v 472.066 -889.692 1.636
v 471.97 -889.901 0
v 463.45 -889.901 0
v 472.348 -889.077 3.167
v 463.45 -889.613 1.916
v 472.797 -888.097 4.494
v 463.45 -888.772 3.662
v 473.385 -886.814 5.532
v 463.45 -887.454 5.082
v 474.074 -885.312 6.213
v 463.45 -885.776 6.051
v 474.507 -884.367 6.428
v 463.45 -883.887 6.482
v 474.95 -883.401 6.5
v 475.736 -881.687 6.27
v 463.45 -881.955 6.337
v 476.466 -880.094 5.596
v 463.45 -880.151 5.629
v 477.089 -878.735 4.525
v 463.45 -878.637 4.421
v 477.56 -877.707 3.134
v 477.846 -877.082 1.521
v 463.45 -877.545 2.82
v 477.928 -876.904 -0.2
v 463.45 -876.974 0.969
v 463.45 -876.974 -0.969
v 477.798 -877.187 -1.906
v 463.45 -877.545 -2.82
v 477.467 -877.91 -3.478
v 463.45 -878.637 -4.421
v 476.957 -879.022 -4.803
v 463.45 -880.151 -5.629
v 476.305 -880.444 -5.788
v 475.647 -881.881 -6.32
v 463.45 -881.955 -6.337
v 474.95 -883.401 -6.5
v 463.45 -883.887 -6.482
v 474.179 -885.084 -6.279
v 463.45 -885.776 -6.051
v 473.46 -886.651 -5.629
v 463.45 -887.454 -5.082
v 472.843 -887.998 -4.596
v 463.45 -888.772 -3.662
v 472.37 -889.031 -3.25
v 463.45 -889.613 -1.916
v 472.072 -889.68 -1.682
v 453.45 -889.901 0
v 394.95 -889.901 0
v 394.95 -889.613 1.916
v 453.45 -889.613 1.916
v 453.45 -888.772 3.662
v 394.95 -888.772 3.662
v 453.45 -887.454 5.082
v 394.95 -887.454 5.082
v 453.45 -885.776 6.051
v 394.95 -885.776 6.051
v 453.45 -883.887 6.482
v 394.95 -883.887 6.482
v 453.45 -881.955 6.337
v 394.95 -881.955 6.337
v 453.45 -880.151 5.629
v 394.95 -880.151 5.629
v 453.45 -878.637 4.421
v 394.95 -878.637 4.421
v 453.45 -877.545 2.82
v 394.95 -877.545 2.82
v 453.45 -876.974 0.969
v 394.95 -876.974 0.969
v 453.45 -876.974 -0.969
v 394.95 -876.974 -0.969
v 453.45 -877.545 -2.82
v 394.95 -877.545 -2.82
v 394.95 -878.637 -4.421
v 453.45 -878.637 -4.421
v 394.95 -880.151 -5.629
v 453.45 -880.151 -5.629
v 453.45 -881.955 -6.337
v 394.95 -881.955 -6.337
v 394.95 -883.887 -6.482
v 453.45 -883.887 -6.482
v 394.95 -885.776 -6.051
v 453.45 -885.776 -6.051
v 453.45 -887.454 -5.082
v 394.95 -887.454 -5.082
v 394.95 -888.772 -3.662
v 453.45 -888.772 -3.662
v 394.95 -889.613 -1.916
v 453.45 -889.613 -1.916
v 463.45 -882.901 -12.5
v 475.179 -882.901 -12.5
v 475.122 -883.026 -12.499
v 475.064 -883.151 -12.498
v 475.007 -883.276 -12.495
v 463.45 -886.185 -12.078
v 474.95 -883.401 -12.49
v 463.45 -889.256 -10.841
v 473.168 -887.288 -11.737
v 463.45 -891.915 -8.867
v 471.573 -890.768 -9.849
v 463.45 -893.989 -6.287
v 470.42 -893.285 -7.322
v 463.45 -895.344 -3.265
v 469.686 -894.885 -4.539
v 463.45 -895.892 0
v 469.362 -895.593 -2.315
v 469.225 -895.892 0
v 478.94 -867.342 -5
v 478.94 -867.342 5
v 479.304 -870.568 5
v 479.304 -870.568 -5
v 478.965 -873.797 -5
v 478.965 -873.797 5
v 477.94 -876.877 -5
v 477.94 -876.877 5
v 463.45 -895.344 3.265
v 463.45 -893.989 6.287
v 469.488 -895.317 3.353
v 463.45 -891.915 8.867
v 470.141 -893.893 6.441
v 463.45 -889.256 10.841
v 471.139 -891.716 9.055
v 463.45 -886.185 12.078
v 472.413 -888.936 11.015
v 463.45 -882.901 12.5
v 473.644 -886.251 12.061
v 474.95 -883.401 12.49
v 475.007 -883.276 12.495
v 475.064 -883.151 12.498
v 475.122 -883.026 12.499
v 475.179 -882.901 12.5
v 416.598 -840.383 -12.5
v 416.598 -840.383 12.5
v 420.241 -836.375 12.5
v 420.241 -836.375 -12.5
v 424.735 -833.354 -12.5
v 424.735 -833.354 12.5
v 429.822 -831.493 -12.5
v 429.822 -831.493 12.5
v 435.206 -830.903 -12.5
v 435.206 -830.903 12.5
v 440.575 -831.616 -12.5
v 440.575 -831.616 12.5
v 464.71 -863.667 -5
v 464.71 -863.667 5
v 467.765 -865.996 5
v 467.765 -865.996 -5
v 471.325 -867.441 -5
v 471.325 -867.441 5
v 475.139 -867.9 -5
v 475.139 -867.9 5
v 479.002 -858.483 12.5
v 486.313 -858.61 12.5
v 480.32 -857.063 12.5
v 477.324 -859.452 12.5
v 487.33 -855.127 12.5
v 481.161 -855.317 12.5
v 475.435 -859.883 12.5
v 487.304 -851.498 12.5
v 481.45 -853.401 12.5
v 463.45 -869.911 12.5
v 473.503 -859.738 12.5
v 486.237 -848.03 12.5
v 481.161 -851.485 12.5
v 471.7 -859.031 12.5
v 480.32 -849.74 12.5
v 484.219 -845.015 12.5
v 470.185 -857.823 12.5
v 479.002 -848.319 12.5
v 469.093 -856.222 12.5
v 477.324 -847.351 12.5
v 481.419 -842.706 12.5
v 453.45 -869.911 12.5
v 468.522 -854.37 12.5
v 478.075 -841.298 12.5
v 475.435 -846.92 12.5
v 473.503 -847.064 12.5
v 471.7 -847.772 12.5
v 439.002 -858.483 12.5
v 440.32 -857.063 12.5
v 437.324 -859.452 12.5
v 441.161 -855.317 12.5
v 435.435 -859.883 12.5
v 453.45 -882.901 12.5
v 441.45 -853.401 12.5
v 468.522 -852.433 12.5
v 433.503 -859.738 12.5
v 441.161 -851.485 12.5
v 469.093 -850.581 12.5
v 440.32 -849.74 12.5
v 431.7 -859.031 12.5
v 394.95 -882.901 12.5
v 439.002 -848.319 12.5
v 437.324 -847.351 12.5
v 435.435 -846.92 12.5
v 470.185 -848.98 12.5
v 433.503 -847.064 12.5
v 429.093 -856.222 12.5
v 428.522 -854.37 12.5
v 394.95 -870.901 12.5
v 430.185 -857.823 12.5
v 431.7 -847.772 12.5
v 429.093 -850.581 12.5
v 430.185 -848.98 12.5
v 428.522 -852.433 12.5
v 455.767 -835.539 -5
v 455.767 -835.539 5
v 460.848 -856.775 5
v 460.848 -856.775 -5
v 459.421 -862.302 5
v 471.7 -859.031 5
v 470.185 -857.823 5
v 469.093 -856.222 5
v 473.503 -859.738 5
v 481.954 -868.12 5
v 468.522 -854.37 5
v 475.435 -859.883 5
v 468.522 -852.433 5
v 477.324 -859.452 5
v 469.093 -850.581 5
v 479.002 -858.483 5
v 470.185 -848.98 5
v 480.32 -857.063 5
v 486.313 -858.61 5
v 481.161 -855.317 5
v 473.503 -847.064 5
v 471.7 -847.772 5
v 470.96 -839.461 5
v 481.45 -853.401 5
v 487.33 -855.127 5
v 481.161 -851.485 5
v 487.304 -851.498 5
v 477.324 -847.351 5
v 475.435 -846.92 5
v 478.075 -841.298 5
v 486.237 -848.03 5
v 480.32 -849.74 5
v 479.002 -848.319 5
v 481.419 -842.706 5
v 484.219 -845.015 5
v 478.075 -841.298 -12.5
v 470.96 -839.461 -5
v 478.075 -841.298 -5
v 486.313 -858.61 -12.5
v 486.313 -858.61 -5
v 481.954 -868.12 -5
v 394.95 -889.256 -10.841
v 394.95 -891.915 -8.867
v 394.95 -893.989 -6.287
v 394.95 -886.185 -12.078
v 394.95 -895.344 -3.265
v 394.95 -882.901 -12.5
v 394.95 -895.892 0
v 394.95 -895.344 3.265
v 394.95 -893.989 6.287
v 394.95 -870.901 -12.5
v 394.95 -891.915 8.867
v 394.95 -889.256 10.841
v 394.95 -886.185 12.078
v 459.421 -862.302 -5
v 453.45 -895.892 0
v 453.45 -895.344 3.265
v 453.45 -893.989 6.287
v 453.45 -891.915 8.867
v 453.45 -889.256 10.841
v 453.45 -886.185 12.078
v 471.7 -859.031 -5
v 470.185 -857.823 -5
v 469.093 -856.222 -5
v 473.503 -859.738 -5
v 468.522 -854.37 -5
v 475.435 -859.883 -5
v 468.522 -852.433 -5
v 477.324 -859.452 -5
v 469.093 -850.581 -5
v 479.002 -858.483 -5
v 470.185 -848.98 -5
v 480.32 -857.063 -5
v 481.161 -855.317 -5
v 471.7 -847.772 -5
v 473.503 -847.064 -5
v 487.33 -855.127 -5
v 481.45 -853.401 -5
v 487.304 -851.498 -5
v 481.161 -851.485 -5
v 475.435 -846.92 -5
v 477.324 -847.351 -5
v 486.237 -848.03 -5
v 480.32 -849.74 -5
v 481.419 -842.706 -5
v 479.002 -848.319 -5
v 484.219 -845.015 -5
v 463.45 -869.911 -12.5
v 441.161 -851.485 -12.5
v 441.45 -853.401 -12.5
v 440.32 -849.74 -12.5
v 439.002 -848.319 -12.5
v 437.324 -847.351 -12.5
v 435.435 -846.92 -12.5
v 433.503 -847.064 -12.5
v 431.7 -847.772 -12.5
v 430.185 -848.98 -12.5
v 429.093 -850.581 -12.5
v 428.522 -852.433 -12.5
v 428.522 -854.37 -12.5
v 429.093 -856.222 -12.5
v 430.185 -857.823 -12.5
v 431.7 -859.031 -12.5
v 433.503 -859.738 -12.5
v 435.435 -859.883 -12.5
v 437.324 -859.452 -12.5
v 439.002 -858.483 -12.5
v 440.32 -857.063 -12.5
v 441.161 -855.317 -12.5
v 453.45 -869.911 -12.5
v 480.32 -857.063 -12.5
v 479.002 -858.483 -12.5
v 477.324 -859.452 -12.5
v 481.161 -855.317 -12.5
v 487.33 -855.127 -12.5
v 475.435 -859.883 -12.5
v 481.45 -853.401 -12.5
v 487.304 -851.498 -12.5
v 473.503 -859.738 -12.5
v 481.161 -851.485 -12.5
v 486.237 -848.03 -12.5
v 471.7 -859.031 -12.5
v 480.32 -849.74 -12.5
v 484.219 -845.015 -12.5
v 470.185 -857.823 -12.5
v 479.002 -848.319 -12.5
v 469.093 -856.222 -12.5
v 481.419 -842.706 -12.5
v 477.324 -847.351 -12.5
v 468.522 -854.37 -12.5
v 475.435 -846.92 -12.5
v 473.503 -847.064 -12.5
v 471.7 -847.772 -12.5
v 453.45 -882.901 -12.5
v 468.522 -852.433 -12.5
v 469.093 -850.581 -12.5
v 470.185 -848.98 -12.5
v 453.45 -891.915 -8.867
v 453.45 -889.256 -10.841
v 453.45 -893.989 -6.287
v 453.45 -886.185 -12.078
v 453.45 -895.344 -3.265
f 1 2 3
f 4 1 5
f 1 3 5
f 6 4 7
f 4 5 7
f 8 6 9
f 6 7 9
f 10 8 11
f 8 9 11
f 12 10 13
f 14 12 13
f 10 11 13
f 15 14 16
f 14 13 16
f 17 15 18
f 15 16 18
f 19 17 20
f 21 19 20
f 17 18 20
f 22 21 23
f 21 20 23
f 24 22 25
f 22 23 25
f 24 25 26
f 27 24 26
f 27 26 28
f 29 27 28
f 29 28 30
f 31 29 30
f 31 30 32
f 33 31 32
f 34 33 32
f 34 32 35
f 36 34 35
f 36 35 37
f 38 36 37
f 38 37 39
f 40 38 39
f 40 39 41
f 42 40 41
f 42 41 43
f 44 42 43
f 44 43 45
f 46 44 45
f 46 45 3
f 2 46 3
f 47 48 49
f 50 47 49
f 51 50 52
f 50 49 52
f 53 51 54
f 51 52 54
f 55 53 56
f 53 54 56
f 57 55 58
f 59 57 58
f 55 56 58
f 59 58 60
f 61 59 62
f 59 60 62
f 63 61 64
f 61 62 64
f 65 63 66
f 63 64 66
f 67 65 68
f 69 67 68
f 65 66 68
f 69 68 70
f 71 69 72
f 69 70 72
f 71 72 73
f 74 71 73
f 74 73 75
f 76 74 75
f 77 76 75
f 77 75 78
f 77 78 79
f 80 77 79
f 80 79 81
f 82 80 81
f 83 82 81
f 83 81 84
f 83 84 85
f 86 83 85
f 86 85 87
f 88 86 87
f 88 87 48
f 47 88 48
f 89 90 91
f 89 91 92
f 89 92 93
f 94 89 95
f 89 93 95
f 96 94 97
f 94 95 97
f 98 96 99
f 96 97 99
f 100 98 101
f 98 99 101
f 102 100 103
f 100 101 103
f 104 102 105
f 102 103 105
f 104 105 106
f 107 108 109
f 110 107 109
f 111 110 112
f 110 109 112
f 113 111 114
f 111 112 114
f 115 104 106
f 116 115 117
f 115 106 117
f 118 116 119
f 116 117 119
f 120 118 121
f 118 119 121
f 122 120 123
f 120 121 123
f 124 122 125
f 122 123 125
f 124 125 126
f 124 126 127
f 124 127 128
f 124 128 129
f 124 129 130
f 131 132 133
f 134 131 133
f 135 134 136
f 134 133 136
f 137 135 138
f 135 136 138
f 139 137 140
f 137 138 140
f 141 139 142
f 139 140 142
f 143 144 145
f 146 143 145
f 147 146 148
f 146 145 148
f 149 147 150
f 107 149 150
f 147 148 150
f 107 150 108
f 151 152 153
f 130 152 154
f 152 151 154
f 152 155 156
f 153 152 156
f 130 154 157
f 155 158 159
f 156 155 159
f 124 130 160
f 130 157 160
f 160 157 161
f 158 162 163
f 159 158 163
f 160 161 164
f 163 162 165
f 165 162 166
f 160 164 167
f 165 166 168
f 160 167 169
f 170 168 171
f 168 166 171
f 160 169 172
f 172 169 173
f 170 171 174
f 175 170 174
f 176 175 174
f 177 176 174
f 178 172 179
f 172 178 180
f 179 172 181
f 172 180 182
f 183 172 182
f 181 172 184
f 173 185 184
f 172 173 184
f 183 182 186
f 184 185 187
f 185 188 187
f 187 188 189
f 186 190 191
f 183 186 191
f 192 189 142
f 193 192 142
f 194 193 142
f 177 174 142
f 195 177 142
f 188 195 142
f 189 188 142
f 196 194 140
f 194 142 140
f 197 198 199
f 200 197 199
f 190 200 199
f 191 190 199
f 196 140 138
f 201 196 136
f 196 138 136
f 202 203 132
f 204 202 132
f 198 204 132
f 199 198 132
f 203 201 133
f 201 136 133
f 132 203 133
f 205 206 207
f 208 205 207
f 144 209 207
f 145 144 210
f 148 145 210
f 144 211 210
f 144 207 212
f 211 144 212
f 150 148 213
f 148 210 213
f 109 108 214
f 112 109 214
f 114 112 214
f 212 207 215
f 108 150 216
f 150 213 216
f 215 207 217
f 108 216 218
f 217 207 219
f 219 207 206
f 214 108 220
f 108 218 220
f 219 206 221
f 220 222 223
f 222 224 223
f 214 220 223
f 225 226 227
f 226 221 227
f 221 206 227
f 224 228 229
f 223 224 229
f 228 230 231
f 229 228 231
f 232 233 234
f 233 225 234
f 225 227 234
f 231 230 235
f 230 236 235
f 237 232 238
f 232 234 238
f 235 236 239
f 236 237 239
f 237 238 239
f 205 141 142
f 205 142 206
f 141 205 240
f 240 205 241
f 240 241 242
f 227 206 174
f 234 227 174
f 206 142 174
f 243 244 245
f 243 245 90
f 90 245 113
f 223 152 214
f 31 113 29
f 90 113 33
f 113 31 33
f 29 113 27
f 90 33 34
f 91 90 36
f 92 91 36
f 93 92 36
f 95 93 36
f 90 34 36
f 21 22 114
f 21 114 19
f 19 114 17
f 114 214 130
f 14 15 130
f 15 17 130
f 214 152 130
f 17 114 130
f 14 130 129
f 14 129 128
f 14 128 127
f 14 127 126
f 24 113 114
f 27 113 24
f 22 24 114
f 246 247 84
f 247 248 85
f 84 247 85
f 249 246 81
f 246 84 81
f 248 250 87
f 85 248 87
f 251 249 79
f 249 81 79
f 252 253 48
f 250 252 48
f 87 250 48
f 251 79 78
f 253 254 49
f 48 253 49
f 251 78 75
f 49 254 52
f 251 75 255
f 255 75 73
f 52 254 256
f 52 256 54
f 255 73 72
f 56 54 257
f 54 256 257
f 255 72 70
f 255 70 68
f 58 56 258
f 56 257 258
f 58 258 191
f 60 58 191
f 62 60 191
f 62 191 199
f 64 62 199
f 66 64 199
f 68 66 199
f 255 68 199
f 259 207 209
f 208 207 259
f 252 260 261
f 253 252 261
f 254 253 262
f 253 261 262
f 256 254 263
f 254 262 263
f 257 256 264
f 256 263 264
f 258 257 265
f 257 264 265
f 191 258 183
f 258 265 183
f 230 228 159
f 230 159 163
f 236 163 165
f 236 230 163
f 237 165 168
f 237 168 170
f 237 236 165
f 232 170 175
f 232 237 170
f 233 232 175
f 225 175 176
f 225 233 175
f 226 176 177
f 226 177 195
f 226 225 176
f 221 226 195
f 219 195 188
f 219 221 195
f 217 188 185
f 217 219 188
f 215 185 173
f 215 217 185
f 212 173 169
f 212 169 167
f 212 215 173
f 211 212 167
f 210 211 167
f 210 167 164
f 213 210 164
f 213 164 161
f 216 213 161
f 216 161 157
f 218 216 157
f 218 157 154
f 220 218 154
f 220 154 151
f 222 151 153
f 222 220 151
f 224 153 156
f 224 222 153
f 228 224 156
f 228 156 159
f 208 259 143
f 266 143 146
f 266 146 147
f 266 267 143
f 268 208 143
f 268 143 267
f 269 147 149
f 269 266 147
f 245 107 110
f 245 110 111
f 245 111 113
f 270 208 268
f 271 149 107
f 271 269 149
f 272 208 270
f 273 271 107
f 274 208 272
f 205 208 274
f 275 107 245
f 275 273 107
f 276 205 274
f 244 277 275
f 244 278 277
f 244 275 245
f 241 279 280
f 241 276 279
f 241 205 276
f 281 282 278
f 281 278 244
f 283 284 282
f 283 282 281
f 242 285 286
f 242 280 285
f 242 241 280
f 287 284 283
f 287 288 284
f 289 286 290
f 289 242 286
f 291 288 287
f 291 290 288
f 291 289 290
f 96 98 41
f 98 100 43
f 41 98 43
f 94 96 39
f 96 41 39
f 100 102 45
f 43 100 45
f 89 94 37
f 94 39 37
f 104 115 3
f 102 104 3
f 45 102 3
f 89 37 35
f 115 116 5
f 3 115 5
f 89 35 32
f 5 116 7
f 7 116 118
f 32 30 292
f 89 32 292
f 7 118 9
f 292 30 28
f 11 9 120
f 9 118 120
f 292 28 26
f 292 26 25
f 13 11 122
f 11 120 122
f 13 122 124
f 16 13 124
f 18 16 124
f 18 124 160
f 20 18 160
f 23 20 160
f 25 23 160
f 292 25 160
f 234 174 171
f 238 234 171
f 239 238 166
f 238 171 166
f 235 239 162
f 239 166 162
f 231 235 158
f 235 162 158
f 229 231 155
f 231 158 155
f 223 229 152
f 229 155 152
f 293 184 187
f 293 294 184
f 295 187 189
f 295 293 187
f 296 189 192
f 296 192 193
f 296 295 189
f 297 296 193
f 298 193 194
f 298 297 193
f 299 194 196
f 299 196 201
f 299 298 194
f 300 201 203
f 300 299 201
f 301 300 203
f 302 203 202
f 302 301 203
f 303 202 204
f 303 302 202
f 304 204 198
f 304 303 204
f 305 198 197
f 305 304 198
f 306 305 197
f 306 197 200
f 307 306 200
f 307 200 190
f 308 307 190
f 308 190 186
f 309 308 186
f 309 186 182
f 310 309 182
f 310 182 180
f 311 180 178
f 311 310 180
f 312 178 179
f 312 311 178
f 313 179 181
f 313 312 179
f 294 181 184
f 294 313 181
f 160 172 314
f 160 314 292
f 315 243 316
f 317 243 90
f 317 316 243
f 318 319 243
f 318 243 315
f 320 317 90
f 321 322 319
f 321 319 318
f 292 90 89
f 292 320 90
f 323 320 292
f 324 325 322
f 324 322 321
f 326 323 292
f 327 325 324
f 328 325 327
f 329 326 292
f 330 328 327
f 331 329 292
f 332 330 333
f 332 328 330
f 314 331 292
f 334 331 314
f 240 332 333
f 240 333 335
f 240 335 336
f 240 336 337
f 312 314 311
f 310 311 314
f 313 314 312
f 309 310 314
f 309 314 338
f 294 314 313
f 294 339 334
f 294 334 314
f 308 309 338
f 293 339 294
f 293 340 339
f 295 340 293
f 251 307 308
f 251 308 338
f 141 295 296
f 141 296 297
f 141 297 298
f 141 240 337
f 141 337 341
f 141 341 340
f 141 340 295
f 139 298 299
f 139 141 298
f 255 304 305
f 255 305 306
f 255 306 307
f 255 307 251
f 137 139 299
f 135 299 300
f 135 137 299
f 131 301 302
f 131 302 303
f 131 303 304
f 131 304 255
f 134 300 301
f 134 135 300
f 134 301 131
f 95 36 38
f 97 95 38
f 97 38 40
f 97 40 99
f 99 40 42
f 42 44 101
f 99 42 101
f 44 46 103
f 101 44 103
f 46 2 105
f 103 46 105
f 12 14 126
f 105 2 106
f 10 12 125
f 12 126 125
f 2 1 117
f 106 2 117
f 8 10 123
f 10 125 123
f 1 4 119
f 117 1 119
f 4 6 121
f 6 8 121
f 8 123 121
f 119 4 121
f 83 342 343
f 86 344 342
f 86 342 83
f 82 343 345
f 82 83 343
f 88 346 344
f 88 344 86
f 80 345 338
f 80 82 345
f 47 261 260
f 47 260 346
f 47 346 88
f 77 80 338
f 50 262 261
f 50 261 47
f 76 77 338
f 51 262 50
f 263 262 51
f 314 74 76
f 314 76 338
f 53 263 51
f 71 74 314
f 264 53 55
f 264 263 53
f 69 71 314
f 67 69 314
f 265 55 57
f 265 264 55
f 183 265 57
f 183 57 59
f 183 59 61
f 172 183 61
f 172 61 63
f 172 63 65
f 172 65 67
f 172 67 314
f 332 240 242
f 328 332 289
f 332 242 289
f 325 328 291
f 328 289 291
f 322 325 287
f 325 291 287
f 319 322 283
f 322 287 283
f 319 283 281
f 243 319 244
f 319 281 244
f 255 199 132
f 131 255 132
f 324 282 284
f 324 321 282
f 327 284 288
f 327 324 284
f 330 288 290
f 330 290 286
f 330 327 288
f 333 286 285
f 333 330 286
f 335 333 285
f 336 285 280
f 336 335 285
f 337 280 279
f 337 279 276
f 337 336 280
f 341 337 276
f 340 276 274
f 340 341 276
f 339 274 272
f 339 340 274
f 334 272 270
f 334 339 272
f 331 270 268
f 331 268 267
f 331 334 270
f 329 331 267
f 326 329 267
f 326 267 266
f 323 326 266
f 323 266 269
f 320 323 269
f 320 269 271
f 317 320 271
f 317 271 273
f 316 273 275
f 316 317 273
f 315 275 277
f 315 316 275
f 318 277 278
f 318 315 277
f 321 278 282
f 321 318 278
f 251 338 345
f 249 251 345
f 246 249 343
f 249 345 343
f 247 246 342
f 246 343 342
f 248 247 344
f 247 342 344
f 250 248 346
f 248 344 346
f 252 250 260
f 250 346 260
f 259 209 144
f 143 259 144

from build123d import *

# Parameters (mm, degrees)
SKETCH1_R           = 22.5
SKETCH1_R_2         = 6.5
BOSS_EXTRUDE1_DEPTH = 12.5
SKETCH2_R           = 6.5
BOSS_EXTRUDE2_DEPTH = 12.5
SKETCH3_R           = 6.5
CUT_EXTRUDE1_DEPTH  = 901.750681353
FILLET1_R           = 13
SKETCH4_W           = 10
SKETCH4_H           = 25.980762113
CUT_EXTRUDE2_DEPTH  = 1021.222656563
SKETCH5_R           = 6.5
CUT_EXTRUDE3_DEPTH  = 5
SKETCH6_W           = 23.820751316
SKETCH6_H           = 10
CUT_EXTRUDE4_DEPTH  = 25
FILLET2_R           = 15


with BuildPart() as part:
    # Sketch1 → Boss-Extrude1 (new, symmetric)
    with BuildSketch(Plane.XY):
        with Locations((434.94970424, -853.401384058)):
            Circle(SKETCH1_R)
        with Locations((434.94970424, -853.401384058)):
            Circle(SKETCH1_R_2, mode=Mode.SUBTRACT)
    extrude(amount=BOSS_EXTRUDE1_DEPTH, both=True)

    # Sketch2 → Boss-Extrude2 (add, symmetric)
    with BuildSketch(Plane.XY):
        with BuildLine():
            Line((440.57470424, -831.615852736), (478.07470424, -841.298311101))
            ThreePointArc((478.07470424, -841.298311101), (486.236797951, -848.030023379), (486.312946026, -858.609717392))
            Line((486.312946026, -858.609717392), (474.94970424, -883.401384058))
            Line((474.94970424, -883.401384058), (469.220338634, -895.901384058))
            Line((469.220338634, -895.901384058), (394.94970424, -895.901384058))
            Line((394.94970424, -895.901384058), (394.94970424, -870.901384058))
            Line((394.94970424, -870.901384058), (416.598084064, -840.383395085))
            ThreePointArc((416.598084064, -840.383395085), (427.222533672, -832.269871216), (440.57470424, -831.615852736))
        make_face()
        with Locations((474.94970424, -853.401384058)):
            Circle(SKETCH2_R, mode=Mode.SUBTRACT)
        with Locations((434.94970424, -853.401384058)):
            Circle(SKETCH2_R, mode=Mode.SUBTRACT)
    extrude(amount=BOSS_EXTRUDE2_DEPTH, both=True)

    # Sketch3 → Cut-Extrude1 (cut, through all)
    with BuildSketch(Plane.ZY.offset(-394.94970424)):
        with Locations(Location((0, -883.401384058, 0), (0, 0, 270))):
            Circle(SKETCH3_R)
    extrude(amount=-CUT_EXTRUDE1_DEPTH, mode=Mode.SUBTRACT)

    # Fillet1
    # the kernel refuses this fillet: 13 mm, written as the material it takes off along each edge
    with BuildSketch(Plane(origin=(501.720338634, -895.901384058, -12.5), x_dir=(0, 1, 0), z_dir=(-1, 0, 0))) as fillet1_piece_1:
        with BuildLine():
            CenterArc((FILLET1_R, -FILLET1_R), FILLET1_R, 90, 90)
            Line((0, -FILLET1_R), (0, 0))
            Line((0, 0), (FILLET1_R, 0))
        make_face()
    extrude(amount=139.270634394, mode=Mode.SUBTRACT)
    with BuildSketch(Plane(origin=(501.720338634, -895.901384058, 12.5), x_dir=(0, 1, 0), z_dir=(-1, 0, 0))) as fillet1_piece_2:
        with BuildLine():
            CenterArc((FILLET1_R, FILLET1_R), FILLET1_R, 180, 90)
            Line((0, FILLET1_R), (0, 0))
            Line((0, 0), (FILLET1_R, 0))
        make_face()
    extrude(amount=139.270634394, mode=Mode.SUBTRACT)

    # Sketch4 → Cut-Extrude2 (cut, through all)
    with BuildSketch(Plane.XY.offset(12.5)):
        with Locations((458.44970424, -882.901384059)):
            Rectangle(SKETCH4_W, SKETCH4_H)
    extrude(amount=-CUT_EXTRUDE2_DEPTH, mode=Mode.SUBTRACT)

    # Sketch5 → Cut-Extrude3 (cut, symmetric)
    with BuildSketch(Plane.XY):
        with BuildLine():
            Line((470.959579505, -839.461193794), (455.767141872, -835.538523265))
            Line((455.767141872, -835.538523265), (460.847639703, -856.775072808))
            ThreePointArc((460.847639703, -856.775072808), (487.47066386, -860.7140833), (470.959579505, -839.461193794))
        make_face()
        with Locations((474.94970424, -853.401384058)):
            Circle(SKETCH5_R, mode=Mode.SUBTRACT)
    extrude(amount=CUT_EXTRUDE3_DEPTH, both=True, mode=Mode.SUBTRACT)

    # Sketch6 → Cut-Extrude4 (cut)
    with BuildSketch(Plane(origin=(-173.766227741, -672.993706172, 0), x_dir=(0.9682458365518545, -0.24999999999999928, 0), z_dir=(0.24999999999999928, 0.9682458365518545, 0))):
        with Locations((672.317952287, 0)):
            Rectangle(SKETCH6_W, SKETCH6_H)
    extrude(amount=-CUT_EXTRUDE4_DEPTH, mode=Mode.SUBTRACT)

    # Fillet2
    # the kernel refuses this fillet: 15 mm, written as the material it takes off along each edge
    with BuildSketch(Plane(origin=(481.95399382, -868.119828339, 5), x_dir=(-0.9682458365518494, 0.2500000000000187, 0), z_dir=(0, 0, -1))) as fillet2_piece_1:
        with BuildLine():
            CenterArc((16.462547076, -6.840323223), FILLET2_R, 152.869318281, 37.277487885)
            Line((1.697153218, -9.482887166), (0, 0))
            Line((0, 0), (3.113016066, 0))
        make_face()
    extrude(amount=10, mode=Mode.SUBTRACT)


solid = part.part
